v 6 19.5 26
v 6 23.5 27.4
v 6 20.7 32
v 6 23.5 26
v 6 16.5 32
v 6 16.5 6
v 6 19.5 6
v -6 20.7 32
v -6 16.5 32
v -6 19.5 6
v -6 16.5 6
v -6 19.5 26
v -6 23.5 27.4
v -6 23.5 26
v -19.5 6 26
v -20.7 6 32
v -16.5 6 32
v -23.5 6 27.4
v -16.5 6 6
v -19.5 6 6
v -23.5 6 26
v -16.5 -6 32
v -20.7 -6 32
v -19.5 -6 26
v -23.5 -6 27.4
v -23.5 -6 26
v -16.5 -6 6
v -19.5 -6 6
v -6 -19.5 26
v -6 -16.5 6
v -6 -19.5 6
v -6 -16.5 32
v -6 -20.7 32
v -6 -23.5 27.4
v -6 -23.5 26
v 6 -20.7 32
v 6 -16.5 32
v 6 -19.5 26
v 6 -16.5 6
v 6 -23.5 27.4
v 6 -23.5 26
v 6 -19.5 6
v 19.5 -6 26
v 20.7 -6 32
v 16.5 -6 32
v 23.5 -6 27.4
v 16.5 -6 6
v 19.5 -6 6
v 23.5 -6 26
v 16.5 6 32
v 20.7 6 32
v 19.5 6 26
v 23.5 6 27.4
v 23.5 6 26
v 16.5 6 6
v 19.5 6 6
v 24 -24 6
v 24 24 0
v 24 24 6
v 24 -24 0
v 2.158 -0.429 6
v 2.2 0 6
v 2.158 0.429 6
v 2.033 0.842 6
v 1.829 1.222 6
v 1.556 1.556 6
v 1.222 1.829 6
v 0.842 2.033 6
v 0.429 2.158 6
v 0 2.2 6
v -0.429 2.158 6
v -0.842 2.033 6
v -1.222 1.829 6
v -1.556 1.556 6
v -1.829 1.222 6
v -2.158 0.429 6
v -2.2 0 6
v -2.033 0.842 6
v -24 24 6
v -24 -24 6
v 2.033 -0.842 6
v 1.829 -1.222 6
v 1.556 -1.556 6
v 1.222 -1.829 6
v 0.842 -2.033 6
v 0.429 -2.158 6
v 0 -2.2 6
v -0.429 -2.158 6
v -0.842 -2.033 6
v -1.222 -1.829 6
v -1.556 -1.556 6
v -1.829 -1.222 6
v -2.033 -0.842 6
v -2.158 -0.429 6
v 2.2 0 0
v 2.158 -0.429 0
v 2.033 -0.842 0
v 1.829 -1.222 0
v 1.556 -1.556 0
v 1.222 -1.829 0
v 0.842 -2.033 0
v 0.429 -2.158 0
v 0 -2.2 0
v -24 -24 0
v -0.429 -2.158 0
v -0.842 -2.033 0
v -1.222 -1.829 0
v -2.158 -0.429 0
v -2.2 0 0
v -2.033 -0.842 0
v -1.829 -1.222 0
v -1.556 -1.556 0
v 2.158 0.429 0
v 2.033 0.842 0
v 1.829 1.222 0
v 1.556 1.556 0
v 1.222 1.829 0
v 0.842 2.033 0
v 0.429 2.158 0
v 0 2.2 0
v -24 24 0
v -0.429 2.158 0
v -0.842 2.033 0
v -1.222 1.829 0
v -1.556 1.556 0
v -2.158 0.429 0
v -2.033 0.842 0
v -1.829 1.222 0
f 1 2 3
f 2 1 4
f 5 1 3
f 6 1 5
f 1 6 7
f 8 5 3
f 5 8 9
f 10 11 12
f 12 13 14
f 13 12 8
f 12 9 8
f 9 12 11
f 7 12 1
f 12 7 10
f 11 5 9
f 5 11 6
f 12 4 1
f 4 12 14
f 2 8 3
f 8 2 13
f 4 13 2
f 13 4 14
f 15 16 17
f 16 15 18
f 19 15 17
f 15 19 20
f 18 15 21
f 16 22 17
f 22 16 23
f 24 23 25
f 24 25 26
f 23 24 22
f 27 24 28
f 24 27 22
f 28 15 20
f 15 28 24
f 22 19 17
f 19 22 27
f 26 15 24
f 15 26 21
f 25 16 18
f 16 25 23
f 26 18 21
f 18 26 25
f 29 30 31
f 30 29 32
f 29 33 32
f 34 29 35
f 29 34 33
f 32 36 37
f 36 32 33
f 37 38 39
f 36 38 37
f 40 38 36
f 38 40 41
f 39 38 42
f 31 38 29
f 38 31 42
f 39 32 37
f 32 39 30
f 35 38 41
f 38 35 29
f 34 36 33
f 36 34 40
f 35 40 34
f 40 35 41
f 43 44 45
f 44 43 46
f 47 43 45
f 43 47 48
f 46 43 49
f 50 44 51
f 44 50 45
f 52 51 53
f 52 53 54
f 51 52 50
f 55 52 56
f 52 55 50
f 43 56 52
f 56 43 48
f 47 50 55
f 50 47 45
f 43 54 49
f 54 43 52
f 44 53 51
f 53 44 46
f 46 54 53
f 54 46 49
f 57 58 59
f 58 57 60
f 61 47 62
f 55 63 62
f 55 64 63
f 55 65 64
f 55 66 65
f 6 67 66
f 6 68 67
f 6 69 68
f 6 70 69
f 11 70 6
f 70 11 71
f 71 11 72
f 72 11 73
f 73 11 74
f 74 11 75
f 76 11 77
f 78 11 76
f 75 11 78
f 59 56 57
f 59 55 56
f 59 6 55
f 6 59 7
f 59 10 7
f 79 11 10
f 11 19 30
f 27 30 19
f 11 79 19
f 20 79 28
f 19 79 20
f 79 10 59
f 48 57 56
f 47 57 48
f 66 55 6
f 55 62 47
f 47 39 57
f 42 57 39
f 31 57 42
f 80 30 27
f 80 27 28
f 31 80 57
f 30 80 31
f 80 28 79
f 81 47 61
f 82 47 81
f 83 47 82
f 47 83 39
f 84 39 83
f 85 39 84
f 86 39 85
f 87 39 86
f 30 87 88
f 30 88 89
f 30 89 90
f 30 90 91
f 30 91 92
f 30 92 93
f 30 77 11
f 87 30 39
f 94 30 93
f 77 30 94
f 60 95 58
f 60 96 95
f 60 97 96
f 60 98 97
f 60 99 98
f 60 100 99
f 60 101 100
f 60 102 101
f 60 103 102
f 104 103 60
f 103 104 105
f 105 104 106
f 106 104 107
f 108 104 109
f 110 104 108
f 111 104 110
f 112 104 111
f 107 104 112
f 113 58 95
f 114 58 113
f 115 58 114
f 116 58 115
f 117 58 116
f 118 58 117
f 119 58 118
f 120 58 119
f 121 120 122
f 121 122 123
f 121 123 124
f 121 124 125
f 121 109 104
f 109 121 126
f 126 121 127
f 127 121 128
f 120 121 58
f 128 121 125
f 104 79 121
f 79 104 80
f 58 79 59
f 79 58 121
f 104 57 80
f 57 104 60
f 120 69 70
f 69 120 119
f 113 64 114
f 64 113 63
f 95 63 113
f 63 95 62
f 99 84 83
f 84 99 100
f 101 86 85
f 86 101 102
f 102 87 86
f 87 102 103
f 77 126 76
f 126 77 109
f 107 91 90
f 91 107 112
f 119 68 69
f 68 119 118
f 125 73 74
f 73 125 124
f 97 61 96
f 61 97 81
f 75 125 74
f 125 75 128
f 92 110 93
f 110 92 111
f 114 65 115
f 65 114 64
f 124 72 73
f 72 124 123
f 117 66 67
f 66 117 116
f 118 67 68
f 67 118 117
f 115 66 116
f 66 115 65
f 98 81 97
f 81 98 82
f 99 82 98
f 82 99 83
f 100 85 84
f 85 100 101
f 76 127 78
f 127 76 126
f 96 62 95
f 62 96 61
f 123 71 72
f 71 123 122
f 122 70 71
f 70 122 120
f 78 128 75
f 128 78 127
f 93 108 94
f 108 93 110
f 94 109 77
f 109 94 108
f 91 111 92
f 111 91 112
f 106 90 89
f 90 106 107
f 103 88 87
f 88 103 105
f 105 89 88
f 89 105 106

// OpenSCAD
$fn = 32;

// ----------------------------------------------------------------------
// Snap-fit latch: 4 arms, 26 mm tall, 4.2 mm undercut hooks
// ----------------------------------------------------------------------

// --- parameters (mm) ---
base_d = 48;              // base plate depth
base_h = 6;               // base plate thickness
span = 36;                // distance between opposite arms
arm_t = 3;                // arm thickness
arm_d = 12;               // arm width
height = 26;              // free arm length
head_len = 4.2;           // hook reach
head_h = 6;               // hook height
lead = 1.4;               // lead-in ramp thickness
bore_d = 4.4;             // base fixing bore
top_z = 32;               // height of the arm tips above the base

arms = 4;

difference() {
  union() {
    /* base plate, centred on the arm ring */
    translate([-24, -24, 0]) cube([base_d, base_d, base_h]);
    for (a = [0 : 360 / arms : 359]) rotate([0, 0, a]) {
    /* arm, sunk 0.5 mm into the base */
    translate([-arm_d / 2, span / 2 - arm_t / 2, base_h - 0.5]) cube([arm_d, arm_t, height + 0.5]);
    /* hook: a convex hull of a tall inner block and a thin outer lip
       gives a flat undercut below and a lead-in ramp on top */
    hull() {
      translate([-arm_d / 2, span / 2 + arm_t / 2 - 0.6, top_z - head_h]) cube([arm_d, lead + 0.4, head_h]);
      translate([-arm_d / 2, span / 2 + arm_t / 2 - 0.2, top_z - head_h]) cube([arm_d, head_len, lead]);
    }
    }
  }
  translate([0, 0, -2.5]) cylinder(h = base_h + 5, d = bore_d);
}
